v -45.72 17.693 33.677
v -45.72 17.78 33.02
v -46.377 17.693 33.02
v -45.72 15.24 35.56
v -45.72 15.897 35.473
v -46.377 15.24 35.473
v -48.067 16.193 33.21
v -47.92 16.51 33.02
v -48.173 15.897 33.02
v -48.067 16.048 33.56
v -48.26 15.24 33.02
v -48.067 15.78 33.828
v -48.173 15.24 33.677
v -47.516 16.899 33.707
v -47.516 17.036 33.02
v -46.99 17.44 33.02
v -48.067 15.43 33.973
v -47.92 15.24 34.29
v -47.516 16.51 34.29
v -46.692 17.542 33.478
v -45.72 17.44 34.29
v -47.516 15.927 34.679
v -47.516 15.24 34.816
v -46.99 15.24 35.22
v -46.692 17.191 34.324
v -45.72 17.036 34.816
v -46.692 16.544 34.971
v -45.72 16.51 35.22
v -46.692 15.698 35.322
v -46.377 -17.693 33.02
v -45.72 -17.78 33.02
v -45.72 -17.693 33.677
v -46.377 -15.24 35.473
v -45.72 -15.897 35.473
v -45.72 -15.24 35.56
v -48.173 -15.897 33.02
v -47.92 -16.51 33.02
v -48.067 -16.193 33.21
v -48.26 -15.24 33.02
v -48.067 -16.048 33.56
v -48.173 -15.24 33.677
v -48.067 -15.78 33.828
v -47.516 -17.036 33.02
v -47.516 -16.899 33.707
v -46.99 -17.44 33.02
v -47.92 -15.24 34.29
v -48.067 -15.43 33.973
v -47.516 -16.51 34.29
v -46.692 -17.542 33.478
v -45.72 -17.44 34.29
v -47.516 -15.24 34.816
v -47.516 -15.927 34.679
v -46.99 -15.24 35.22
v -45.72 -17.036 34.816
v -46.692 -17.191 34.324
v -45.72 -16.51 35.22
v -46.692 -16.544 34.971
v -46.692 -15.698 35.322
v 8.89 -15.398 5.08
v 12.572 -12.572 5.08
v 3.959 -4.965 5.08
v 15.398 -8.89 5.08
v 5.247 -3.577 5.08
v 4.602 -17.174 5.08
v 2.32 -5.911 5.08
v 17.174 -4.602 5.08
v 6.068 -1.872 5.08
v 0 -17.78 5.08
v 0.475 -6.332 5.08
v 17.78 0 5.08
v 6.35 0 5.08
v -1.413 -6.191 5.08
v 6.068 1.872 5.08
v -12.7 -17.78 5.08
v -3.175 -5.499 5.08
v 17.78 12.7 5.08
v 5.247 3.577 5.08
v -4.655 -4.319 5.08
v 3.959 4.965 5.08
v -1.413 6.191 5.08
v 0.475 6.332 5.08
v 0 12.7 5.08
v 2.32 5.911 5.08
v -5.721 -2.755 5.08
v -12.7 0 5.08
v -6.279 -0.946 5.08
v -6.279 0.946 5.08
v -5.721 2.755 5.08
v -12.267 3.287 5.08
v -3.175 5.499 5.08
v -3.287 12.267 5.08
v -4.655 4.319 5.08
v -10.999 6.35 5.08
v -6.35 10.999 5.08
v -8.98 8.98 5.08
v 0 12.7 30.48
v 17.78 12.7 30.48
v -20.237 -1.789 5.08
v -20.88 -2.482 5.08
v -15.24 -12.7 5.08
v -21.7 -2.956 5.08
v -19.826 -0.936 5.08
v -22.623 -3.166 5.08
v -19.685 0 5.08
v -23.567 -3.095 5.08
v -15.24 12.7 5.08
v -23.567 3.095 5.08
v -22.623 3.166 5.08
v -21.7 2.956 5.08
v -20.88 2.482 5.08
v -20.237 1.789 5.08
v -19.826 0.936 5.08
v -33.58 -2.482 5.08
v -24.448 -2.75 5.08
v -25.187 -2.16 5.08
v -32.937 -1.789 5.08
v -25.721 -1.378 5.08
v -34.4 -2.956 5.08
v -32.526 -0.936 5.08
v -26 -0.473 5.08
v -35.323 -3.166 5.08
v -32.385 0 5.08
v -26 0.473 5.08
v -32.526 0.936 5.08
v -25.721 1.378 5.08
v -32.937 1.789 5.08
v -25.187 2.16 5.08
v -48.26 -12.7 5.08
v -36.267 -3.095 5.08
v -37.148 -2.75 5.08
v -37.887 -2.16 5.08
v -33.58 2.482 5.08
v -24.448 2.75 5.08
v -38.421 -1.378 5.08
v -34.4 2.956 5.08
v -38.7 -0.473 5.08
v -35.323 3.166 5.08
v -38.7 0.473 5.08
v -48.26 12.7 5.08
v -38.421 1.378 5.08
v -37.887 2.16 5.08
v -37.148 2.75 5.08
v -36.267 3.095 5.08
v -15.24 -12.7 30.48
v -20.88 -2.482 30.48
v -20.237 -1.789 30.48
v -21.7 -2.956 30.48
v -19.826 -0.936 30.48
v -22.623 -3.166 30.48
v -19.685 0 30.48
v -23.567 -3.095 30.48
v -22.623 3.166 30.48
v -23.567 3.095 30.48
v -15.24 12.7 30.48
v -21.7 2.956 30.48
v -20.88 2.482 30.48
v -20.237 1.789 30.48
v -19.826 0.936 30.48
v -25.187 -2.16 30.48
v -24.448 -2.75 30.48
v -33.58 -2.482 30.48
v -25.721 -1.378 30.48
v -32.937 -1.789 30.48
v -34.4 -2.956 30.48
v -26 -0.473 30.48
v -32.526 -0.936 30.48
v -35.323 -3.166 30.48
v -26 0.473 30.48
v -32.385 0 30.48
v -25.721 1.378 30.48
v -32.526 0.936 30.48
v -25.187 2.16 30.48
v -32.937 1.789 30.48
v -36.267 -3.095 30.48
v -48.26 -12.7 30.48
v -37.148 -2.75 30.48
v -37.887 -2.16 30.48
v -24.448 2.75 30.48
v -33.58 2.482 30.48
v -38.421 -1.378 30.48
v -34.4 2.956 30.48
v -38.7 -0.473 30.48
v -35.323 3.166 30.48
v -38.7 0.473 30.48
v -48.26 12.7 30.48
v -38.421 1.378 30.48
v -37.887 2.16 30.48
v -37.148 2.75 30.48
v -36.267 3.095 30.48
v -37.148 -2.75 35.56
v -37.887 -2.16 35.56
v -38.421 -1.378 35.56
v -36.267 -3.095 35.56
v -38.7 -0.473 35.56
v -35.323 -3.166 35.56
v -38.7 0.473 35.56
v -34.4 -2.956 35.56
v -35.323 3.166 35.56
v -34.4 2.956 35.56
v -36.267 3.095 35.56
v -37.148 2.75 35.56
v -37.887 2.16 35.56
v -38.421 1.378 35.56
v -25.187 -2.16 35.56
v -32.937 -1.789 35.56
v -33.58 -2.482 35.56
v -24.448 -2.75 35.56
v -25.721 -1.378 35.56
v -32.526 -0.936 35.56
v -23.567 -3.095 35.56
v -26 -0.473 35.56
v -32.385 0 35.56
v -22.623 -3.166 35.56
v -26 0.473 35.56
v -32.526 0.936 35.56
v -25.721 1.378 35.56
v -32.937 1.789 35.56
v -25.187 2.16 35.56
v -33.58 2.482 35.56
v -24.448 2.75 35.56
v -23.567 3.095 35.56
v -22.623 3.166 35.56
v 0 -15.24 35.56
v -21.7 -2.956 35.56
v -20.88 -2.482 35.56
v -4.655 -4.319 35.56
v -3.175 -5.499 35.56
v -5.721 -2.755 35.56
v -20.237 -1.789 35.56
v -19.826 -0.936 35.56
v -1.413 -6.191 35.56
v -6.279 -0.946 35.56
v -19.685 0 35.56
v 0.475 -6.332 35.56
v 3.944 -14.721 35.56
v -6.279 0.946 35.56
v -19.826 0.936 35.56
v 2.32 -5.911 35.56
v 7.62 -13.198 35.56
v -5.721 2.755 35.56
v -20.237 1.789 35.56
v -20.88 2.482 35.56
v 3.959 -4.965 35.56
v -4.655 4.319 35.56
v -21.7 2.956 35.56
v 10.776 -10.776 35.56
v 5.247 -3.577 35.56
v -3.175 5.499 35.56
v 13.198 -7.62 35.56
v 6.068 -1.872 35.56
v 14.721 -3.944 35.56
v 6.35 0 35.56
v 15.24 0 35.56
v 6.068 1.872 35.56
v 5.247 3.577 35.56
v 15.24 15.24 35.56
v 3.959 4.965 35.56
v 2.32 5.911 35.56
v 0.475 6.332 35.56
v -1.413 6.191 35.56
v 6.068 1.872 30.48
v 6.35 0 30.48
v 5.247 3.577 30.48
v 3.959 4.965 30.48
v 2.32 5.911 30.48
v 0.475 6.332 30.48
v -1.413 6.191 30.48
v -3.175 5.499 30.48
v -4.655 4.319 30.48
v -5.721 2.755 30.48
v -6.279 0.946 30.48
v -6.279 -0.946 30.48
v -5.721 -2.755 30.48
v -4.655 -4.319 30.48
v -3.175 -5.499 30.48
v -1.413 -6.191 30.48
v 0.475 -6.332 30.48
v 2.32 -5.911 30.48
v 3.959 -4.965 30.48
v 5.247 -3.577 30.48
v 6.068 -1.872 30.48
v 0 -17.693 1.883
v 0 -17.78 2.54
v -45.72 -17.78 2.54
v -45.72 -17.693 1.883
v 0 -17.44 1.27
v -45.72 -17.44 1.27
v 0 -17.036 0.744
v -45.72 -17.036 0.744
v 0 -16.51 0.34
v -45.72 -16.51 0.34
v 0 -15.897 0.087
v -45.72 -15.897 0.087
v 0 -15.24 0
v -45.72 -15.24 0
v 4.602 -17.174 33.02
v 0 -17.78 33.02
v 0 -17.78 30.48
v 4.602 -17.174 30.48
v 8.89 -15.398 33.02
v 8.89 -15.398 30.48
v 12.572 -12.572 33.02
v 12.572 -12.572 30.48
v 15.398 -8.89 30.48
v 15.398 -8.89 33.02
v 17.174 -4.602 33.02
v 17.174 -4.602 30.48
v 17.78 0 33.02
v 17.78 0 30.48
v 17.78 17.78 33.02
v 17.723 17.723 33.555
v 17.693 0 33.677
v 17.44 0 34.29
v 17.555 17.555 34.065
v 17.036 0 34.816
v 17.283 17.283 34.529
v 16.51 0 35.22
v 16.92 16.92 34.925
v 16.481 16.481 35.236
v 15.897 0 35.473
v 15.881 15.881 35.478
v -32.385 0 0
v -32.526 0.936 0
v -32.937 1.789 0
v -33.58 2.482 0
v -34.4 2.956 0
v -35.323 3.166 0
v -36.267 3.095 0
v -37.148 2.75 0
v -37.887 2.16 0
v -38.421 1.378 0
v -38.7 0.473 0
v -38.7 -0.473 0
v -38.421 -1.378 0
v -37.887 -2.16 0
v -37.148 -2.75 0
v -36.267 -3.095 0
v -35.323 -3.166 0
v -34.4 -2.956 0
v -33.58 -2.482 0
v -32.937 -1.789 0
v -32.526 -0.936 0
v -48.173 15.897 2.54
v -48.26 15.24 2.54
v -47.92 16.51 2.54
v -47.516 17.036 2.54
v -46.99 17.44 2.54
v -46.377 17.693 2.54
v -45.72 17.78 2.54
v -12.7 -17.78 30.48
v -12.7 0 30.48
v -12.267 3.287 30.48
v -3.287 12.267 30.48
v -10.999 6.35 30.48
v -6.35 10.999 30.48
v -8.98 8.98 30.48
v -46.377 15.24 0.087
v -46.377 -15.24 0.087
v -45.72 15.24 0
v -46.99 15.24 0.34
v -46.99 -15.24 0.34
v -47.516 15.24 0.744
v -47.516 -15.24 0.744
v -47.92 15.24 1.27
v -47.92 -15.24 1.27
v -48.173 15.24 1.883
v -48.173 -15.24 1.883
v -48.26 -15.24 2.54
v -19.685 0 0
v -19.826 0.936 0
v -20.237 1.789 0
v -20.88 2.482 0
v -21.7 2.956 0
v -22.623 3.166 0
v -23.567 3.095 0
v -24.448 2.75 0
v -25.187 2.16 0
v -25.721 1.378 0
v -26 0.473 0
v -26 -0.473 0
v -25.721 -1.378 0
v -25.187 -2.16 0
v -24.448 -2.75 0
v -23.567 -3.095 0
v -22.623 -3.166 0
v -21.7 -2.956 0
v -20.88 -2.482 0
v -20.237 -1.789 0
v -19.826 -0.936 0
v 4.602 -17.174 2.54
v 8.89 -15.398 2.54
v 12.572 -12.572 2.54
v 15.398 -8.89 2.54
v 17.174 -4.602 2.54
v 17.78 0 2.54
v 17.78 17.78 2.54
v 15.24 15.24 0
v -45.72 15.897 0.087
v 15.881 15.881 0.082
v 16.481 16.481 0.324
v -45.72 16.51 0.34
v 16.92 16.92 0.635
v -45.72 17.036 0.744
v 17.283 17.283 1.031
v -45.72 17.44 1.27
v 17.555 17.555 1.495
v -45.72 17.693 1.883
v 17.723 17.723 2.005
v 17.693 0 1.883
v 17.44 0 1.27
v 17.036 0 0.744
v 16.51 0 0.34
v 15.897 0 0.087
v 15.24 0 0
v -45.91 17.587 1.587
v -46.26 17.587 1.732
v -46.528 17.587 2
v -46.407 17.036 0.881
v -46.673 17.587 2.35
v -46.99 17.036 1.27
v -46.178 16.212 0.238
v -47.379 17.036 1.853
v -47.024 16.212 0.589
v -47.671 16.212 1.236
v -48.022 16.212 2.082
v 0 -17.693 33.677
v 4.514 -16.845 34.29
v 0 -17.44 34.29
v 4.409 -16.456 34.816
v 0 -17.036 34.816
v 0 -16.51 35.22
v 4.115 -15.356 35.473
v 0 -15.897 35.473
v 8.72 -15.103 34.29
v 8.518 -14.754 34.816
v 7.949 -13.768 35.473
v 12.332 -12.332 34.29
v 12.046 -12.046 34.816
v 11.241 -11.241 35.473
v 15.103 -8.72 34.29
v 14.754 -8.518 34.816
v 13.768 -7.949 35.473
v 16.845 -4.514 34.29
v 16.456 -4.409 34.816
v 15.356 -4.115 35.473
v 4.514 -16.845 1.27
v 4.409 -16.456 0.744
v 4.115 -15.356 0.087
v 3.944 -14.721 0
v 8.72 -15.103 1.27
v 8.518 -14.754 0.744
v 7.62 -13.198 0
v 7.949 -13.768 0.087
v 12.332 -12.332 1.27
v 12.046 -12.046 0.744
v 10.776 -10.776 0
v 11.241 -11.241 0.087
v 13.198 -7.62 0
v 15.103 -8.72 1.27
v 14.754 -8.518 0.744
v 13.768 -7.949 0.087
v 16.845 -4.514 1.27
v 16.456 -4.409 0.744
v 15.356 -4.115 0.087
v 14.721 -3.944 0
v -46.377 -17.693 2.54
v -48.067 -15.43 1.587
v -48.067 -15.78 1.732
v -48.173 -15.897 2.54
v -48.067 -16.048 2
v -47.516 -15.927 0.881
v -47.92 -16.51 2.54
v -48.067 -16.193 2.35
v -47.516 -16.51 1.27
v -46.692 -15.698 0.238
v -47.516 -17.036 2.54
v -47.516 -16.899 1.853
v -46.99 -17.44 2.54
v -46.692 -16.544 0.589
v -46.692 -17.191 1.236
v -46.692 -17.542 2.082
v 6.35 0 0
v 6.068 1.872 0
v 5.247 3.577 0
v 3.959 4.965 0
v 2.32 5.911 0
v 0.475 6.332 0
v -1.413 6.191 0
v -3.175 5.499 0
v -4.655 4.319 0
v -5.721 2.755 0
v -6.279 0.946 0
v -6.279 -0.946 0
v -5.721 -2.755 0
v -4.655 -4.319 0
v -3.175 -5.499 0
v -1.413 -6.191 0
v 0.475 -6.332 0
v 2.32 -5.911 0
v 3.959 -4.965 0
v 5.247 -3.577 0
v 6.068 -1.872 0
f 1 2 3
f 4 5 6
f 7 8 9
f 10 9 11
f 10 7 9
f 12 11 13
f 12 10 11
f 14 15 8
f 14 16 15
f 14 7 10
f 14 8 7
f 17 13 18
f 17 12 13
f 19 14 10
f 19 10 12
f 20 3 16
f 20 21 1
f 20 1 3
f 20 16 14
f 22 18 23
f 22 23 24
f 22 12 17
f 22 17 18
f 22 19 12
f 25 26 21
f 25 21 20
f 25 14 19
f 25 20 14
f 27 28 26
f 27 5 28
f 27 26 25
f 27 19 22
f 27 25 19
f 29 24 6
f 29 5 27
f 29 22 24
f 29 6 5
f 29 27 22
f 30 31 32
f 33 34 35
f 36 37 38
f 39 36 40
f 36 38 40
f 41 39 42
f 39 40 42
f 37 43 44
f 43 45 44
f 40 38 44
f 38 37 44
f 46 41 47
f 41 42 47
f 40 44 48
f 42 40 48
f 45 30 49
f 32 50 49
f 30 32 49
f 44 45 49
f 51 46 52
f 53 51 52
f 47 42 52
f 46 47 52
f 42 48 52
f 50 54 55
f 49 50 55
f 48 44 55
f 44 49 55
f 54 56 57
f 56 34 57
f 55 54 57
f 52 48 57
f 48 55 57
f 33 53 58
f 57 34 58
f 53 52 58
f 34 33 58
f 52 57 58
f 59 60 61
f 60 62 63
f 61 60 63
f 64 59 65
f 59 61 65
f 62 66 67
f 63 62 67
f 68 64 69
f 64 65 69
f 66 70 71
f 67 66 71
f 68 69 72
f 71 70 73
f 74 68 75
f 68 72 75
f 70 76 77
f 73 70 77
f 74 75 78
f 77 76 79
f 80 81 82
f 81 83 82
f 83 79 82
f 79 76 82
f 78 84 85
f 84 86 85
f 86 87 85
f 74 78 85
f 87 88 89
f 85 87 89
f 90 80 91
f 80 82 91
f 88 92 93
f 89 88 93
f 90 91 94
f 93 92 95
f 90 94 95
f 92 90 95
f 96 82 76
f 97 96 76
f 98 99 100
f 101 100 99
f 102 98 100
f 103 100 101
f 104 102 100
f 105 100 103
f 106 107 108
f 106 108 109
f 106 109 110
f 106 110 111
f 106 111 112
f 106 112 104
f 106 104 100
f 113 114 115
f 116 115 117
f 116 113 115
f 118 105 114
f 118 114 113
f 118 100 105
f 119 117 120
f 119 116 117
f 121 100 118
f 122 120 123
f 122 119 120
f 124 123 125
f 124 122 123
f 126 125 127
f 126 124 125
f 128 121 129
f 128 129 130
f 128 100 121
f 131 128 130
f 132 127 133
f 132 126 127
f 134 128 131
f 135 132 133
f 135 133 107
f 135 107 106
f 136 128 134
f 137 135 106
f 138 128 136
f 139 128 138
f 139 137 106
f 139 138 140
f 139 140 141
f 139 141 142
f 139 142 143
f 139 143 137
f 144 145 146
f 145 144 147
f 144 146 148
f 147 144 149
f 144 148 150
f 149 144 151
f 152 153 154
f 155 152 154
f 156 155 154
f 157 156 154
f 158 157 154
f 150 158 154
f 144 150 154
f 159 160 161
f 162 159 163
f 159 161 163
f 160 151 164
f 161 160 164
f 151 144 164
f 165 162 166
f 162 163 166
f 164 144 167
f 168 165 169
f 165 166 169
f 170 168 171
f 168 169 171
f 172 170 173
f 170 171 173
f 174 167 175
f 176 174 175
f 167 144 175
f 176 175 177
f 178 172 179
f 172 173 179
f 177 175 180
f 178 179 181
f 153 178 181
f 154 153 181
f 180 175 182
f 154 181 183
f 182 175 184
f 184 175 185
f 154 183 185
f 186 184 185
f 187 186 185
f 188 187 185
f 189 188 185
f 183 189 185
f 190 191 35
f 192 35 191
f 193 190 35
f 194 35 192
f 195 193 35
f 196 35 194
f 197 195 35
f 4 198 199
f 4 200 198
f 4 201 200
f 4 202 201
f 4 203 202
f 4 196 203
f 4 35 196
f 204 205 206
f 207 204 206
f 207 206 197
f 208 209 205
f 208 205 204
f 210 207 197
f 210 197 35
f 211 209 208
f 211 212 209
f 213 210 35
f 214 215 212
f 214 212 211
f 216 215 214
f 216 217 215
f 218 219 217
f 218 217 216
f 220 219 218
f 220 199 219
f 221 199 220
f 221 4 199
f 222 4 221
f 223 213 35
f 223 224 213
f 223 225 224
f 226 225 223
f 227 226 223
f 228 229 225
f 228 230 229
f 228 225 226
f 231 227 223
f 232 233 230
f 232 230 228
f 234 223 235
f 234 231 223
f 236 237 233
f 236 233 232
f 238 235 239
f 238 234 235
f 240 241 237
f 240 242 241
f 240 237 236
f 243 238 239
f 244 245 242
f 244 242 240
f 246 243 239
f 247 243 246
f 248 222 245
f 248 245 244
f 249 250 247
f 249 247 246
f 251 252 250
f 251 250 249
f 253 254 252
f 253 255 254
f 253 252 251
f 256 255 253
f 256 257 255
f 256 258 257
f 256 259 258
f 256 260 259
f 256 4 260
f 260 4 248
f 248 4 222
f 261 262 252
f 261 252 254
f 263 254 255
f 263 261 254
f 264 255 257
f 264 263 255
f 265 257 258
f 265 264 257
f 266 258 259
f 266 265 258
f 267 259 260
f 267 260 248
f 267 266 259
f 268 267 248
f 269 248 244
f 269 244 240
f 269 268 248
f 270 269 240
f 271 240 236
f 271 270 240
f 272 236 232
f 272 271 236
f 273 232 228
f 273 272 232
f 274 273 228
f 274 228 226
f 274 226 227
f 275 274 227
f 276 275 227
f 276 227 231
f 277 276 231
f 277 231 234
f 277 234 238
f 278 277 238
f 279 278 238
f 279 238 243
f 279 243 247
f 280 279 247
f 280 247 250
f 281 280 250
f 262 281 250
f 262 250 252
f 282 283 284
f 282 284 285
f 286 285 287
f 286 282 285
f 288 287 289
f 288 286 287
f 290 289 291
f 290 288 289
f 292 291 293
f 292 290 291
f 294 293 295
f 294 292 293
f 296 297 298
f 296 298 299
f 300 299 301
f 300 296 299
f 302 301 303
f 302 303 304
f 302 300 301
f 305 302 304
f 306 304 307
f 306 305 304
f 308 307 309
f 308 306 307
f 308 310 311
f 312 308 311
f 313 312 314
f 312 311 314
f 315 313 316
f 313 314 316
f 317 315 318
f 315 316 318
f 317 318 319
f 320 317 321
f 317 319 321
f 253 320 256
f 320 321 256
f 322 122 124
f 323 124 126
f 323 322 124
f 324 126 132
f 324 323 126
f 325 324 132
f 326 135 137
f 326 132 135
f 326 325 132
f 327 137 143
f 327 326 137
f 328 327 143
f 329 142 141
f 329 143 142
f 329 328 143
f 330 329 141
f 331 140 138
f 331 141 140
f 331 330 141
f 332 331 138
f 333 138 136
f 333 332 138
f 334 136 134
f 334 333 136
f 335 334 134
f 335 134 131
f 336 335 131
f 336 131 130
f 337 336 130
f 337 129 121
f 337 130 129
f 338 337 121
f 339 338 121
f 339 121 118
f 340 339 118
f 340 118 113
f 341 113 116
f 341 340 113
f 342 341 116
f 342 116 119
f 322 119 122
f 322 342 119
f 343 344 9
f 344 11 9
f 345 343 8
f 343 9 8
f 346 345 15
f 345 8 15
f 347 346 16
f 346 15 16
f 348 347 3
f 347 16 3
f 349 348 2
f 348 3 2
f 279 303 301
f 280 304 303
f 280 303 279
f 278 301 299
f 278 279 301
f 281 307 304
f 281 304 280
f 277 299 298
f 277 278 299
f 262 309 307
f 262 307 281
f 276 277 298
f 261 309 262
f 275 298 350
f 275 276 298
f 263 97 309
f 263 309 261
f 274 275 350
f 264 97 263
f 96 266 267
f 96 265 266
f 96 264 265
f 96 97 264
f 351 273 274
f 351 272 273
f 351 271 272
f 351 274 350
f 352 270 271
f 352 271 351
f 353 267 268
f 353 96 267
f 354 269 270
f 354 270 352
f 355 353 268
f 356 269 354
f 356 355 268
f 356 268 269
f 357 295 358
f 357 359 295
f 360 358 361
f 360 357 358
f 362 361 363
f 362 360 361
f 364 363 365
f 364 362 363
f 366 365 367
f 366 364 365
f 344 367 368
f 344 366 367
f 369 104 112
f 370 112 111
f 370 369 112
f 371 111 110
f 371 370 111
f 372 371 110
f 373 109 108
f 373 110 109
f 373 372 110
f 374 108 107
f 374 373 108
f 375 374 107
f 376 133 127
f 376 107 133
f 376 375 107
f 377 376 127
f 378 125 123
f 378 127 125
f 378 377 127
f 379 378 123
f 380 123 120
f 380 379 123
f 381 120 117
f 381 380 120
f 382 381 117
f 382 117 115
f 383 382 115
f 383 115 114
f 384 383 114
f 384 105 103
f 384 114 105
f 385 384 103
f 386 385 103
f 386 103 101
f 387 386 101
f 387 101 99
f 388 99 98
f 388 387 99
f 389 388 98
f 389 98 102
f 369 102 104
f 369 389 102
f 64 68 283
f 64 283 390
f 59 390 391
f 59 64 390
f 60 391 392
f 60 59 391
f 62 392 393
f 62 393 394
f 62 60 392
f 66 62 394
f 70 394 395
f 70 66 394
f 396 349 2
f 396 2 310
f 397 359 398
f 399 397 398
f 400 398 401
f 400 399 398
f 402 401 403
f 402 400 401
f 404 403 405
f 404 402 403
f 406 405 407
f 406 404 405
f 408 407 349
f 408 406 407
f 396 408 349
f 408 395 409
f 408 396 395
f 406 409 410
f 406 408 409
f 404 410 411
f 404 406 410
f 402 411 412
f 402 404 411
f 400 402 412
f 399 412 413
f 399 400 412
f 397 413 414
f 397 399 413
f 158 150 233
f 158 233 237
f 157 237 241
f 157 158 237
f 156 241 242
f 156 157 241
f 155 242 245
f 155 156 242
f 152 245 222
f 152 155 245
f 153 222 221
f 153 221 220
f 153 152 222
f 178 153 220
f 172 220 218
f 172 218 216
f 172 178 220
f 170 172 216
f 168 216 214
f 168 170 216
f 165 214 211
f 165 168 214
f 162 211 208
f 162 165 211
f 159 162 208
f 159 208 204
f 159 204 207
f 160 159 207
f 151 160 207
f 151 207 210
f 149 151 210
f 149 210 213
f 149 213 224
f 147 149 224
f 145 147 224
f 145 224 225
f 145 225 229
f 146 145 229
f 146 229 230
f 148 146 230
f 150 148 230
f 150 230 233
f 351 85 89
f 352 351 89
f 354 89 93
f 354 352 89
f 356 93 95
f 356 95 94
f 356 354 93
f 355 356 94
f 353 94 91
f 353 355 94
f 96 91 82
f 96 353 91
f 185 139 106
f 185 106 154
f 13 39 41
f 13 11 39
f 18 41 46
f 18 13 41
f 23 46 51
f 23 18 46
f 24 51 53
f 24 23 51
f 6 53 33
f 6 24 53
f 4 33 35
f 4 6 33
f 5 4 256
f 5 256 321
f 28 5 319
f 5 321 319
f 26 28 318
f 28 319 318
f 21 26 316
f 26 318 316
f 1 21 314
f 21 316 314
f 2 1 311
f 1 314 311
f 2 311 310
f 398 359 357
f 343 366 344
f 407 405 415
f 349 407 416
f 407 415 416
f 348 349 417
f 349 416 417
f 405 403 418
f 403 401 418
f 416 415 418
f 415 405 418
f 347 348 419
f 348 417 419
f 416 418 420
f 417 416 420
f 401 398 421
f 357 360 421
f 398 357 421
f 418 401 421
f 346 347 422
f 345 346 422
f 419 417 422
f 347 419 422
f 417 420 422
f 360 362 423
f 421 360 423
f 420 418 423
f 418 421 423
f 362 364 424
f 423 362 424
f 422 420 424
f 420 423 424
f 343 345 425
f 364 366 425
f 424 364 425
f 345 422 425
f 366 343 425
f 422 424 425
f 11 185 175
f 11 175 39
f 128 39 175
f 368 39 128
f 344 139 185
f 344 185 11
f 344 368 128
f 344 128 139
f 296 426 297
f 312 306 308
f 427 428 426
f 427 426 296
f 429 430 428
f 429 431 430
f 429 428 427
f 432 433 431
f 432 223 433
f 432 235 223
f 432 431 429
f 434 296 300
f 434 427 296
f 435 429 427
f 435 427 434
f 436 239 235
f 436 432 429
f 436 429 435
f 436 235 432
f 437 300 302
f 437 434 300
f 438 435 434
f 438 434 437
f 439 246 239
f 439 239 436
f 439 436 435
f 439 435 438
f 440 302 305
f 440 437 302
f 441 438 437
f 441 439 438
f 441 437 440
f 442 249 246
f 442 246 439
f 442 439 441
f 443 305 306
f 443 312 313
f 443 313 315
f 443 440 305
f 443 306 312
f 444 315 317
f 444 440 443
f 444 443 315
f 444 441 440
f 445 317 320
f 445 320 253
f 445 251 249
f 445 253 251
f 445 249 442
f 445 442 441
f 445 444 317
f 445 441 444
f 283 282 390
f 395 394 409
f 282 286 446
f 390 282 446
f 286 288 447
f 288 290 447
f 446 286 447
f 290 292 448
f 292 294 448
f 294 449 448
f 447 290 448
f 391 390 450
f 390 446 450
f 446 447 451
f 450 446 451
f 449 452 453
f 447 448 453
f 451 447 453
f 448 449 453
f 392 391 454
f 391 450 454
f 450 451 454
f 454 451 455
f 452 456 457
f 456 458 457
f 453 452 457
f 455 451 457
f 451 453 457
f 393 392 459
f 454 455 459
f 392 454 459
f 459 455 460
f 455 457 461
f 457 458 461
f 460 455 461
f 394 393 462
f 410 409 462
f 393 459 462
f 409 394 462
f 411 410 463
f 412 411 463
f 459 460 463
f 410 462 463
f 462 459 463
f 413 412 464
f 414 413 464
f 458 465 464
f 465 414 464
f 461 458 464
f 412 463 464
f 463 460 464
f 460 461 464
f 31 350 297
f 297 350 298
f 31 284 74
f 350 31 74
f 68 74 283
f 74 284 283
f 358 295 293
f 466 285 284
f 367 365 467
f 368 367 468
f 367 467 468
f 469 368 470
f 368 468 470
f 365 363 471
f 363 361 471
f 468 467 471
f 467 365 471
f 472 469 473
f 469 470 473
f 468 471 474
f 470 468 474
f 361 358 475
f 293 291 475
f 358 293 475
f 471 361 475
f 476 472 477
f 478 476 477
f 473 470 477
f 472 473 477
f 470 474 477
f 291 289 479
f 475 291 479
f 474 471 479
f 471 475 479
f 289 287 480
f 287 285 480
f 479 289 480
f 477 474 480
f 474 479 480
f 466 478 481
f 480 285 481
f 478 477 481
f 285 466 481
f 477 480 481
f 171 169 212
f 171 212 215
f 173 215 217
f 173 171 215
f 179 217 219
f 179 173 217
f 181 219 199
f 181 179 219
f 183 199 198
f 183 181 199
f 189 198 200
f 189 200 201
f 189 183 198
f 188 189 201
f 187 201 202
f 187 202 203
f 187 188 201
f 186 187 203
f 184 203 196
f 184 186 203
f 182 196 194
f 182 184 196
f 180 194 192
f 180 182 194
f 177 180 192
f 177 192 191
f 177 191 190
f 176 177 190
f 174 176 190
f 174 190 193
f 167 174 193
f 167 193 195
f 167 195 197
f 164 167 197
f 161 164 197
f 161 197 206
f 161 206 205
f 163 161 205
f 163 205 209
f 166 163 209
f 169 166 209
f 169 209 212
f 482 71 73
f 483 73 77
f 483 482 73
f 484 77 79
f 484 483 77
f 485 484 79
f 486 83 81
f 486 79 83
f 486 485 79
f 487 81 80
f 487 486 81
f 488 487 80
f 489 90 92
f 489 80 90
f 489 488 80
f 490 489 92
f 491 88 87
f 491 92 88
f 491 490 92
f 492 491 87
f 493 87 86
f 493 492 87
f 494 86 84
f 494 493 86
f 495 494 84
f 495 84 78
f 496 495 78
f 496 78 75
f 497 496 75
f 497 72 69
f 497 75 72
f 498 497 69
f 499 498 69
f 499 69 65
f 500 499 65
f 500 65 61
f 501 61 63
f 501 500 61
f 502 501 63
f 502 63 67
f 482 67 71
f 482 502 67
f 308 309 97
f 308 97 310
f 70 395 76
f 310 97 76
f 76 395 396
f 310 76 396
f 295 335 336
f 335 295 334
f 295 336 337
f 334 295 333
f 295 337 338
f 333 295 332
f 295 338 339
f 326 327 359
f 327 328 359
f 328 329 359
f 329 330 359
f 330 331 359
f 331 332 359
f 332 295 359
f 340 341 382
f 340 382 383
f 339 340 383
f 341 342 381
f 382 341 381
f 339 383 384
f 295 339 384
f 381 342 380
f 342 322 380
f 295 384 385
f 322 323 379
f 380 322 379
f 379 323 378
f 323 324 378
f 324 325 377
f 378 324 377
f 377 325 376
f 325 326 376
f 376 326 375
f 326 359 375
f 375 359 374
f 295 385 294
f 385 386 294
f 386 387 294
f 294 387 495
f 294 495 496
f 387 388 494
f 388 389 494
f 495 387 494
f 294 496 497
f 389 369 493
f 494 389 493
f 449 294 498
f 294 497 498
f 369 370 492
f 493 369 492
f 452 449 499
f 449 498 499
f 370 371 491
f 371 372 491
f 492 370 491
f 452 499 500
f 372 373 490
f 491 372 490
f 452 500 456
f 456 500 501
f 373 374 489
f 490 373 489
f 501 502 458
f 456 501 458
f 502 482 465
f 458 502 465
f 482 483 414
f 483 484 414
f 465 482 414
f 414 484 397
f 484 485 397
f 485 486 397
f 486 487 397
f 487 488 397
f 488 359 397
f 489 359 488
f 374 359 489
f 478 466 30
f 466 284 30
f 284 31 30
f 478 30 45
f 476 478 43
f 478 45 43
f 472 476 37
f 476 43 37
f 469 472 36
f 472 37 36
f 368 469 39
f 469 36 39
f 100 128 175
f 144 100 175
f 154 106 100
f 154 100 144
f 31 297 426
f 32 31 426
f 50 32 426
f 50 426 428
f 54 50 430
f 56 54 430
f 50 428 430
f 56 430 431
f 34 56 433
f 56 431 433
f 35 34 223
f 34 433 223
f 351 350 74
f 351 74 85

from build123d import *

# Parameters (mm, degrees)
SKETCH1_W               = 66.04
SKETCH1_H               = 35.56
SKETCH1_R               = 6.35
SKETCH1_R_2             = 3.175
BOSS_EXTRUDE1_DEPTH     = 35.56
CUT_EXTRUDE1_DEPTH      = 12.7
CUT_EXTRUDE1_DEPTH_BACK = 12.7
SKETCH3_W               = 25.4
SKETCH3_H               = 25.4
CUT_EXTRUDE2_DEPTH      = 33.02
FILLET1_R               = 17.78
FILLET2_R               = 2.54


with BuildPart() as part:
    # Sketch1 → Boss-Extrude1 (new body)
    with BuildSketch(Plane.XY):
        with Locations((-15.24, 0)):
            Rectangle(SKETCH1_W, SKETCH1_H)
        Circle(SKETCH1_R, mode=Mode.SUBTRACT)
        with Locations((-35.56, 0)):
            Circle(SKETCH1_R_2, mode=Mode.SUBTRACT)
        with Locations((-22.86, 0)):
            Circle(SKETCH1_R_2, mode=Mode.SUBTRACT)
    extrude(amount=BOSS_EXTRUDE1_DEPTH)

    # Sketch2 → Cut-Extrude1 (cut, two sides)
    with BuildSketch(Plane.XY.offset(17.78)) as cut_extrude1_sk:
        with BuildLine():
            Line((0, 12.7), (17.78, 12.7))
            Line((17.78, 12.7), (17.78, -17.78))
            Line((17.78, -17.78), (-12.7, -17.78))
            Line((-12.7, -17.78), (-12.7, 0))
            ThreePointArc((-12.7, 0), (-8.980256121, 8.980256121), (0, 12.7))
        make_face()
    extrude(amount=CUT_EXTRUDE1_DEPTH, mode=Mode.SUBTRACT)
    extrude(cut_extrude1_sk.sketch, amount=-CUT_EXTRUDE1_DEPTH_BACK, mode=Mode.SUBTRACT)

    # Sketch3 → Cut-Extrude2 (cut)
    with BuildSketch(Plane.ZY.offset(48.26)):
        with Locations((17.78, 0)):
            Rectangle(SKETCH3_W, SKETCH3_H)
    extrude(amount=-CUT_EXTRUDE2_DEPTH, mode=Mode.SUBTRACT)

    # Fillet1
    fillet1_edges = [part.edges().sort_by_distance(p)[0] for p in [
        (17.78, -17.78, 2.54),
        (17.78, -17.78, 33.02),
    ]]
    fillet(fillet1_edges, radius=FILLET1_R)

    # Fillet2
    fillet2_edges = [part.edges().sort_by_distance(p)[0] for p in [
        (-24.13, -17.78, 35.56),
        (-15.24, 17.78, 35.56),
        (-24.13, -17.78, 0),
        (-48.26, 0, 0),
        (-15.24, 17.78, 0),
        (17.78, 8.89, 0),
        (17.78, 8.89, 35.56),
        (12.572358569, -12.572358569, 35.56),
        (12.572358569, -12.572358569, 0),
        (-48.26, -17.78, 17.78),
        (-48.26, 17.78, 17.78),
        (-48.26, 0, 35.56),
    ]]
    fillet(fillet2_edges, radius=FILLET2_R)


solid = part.part
